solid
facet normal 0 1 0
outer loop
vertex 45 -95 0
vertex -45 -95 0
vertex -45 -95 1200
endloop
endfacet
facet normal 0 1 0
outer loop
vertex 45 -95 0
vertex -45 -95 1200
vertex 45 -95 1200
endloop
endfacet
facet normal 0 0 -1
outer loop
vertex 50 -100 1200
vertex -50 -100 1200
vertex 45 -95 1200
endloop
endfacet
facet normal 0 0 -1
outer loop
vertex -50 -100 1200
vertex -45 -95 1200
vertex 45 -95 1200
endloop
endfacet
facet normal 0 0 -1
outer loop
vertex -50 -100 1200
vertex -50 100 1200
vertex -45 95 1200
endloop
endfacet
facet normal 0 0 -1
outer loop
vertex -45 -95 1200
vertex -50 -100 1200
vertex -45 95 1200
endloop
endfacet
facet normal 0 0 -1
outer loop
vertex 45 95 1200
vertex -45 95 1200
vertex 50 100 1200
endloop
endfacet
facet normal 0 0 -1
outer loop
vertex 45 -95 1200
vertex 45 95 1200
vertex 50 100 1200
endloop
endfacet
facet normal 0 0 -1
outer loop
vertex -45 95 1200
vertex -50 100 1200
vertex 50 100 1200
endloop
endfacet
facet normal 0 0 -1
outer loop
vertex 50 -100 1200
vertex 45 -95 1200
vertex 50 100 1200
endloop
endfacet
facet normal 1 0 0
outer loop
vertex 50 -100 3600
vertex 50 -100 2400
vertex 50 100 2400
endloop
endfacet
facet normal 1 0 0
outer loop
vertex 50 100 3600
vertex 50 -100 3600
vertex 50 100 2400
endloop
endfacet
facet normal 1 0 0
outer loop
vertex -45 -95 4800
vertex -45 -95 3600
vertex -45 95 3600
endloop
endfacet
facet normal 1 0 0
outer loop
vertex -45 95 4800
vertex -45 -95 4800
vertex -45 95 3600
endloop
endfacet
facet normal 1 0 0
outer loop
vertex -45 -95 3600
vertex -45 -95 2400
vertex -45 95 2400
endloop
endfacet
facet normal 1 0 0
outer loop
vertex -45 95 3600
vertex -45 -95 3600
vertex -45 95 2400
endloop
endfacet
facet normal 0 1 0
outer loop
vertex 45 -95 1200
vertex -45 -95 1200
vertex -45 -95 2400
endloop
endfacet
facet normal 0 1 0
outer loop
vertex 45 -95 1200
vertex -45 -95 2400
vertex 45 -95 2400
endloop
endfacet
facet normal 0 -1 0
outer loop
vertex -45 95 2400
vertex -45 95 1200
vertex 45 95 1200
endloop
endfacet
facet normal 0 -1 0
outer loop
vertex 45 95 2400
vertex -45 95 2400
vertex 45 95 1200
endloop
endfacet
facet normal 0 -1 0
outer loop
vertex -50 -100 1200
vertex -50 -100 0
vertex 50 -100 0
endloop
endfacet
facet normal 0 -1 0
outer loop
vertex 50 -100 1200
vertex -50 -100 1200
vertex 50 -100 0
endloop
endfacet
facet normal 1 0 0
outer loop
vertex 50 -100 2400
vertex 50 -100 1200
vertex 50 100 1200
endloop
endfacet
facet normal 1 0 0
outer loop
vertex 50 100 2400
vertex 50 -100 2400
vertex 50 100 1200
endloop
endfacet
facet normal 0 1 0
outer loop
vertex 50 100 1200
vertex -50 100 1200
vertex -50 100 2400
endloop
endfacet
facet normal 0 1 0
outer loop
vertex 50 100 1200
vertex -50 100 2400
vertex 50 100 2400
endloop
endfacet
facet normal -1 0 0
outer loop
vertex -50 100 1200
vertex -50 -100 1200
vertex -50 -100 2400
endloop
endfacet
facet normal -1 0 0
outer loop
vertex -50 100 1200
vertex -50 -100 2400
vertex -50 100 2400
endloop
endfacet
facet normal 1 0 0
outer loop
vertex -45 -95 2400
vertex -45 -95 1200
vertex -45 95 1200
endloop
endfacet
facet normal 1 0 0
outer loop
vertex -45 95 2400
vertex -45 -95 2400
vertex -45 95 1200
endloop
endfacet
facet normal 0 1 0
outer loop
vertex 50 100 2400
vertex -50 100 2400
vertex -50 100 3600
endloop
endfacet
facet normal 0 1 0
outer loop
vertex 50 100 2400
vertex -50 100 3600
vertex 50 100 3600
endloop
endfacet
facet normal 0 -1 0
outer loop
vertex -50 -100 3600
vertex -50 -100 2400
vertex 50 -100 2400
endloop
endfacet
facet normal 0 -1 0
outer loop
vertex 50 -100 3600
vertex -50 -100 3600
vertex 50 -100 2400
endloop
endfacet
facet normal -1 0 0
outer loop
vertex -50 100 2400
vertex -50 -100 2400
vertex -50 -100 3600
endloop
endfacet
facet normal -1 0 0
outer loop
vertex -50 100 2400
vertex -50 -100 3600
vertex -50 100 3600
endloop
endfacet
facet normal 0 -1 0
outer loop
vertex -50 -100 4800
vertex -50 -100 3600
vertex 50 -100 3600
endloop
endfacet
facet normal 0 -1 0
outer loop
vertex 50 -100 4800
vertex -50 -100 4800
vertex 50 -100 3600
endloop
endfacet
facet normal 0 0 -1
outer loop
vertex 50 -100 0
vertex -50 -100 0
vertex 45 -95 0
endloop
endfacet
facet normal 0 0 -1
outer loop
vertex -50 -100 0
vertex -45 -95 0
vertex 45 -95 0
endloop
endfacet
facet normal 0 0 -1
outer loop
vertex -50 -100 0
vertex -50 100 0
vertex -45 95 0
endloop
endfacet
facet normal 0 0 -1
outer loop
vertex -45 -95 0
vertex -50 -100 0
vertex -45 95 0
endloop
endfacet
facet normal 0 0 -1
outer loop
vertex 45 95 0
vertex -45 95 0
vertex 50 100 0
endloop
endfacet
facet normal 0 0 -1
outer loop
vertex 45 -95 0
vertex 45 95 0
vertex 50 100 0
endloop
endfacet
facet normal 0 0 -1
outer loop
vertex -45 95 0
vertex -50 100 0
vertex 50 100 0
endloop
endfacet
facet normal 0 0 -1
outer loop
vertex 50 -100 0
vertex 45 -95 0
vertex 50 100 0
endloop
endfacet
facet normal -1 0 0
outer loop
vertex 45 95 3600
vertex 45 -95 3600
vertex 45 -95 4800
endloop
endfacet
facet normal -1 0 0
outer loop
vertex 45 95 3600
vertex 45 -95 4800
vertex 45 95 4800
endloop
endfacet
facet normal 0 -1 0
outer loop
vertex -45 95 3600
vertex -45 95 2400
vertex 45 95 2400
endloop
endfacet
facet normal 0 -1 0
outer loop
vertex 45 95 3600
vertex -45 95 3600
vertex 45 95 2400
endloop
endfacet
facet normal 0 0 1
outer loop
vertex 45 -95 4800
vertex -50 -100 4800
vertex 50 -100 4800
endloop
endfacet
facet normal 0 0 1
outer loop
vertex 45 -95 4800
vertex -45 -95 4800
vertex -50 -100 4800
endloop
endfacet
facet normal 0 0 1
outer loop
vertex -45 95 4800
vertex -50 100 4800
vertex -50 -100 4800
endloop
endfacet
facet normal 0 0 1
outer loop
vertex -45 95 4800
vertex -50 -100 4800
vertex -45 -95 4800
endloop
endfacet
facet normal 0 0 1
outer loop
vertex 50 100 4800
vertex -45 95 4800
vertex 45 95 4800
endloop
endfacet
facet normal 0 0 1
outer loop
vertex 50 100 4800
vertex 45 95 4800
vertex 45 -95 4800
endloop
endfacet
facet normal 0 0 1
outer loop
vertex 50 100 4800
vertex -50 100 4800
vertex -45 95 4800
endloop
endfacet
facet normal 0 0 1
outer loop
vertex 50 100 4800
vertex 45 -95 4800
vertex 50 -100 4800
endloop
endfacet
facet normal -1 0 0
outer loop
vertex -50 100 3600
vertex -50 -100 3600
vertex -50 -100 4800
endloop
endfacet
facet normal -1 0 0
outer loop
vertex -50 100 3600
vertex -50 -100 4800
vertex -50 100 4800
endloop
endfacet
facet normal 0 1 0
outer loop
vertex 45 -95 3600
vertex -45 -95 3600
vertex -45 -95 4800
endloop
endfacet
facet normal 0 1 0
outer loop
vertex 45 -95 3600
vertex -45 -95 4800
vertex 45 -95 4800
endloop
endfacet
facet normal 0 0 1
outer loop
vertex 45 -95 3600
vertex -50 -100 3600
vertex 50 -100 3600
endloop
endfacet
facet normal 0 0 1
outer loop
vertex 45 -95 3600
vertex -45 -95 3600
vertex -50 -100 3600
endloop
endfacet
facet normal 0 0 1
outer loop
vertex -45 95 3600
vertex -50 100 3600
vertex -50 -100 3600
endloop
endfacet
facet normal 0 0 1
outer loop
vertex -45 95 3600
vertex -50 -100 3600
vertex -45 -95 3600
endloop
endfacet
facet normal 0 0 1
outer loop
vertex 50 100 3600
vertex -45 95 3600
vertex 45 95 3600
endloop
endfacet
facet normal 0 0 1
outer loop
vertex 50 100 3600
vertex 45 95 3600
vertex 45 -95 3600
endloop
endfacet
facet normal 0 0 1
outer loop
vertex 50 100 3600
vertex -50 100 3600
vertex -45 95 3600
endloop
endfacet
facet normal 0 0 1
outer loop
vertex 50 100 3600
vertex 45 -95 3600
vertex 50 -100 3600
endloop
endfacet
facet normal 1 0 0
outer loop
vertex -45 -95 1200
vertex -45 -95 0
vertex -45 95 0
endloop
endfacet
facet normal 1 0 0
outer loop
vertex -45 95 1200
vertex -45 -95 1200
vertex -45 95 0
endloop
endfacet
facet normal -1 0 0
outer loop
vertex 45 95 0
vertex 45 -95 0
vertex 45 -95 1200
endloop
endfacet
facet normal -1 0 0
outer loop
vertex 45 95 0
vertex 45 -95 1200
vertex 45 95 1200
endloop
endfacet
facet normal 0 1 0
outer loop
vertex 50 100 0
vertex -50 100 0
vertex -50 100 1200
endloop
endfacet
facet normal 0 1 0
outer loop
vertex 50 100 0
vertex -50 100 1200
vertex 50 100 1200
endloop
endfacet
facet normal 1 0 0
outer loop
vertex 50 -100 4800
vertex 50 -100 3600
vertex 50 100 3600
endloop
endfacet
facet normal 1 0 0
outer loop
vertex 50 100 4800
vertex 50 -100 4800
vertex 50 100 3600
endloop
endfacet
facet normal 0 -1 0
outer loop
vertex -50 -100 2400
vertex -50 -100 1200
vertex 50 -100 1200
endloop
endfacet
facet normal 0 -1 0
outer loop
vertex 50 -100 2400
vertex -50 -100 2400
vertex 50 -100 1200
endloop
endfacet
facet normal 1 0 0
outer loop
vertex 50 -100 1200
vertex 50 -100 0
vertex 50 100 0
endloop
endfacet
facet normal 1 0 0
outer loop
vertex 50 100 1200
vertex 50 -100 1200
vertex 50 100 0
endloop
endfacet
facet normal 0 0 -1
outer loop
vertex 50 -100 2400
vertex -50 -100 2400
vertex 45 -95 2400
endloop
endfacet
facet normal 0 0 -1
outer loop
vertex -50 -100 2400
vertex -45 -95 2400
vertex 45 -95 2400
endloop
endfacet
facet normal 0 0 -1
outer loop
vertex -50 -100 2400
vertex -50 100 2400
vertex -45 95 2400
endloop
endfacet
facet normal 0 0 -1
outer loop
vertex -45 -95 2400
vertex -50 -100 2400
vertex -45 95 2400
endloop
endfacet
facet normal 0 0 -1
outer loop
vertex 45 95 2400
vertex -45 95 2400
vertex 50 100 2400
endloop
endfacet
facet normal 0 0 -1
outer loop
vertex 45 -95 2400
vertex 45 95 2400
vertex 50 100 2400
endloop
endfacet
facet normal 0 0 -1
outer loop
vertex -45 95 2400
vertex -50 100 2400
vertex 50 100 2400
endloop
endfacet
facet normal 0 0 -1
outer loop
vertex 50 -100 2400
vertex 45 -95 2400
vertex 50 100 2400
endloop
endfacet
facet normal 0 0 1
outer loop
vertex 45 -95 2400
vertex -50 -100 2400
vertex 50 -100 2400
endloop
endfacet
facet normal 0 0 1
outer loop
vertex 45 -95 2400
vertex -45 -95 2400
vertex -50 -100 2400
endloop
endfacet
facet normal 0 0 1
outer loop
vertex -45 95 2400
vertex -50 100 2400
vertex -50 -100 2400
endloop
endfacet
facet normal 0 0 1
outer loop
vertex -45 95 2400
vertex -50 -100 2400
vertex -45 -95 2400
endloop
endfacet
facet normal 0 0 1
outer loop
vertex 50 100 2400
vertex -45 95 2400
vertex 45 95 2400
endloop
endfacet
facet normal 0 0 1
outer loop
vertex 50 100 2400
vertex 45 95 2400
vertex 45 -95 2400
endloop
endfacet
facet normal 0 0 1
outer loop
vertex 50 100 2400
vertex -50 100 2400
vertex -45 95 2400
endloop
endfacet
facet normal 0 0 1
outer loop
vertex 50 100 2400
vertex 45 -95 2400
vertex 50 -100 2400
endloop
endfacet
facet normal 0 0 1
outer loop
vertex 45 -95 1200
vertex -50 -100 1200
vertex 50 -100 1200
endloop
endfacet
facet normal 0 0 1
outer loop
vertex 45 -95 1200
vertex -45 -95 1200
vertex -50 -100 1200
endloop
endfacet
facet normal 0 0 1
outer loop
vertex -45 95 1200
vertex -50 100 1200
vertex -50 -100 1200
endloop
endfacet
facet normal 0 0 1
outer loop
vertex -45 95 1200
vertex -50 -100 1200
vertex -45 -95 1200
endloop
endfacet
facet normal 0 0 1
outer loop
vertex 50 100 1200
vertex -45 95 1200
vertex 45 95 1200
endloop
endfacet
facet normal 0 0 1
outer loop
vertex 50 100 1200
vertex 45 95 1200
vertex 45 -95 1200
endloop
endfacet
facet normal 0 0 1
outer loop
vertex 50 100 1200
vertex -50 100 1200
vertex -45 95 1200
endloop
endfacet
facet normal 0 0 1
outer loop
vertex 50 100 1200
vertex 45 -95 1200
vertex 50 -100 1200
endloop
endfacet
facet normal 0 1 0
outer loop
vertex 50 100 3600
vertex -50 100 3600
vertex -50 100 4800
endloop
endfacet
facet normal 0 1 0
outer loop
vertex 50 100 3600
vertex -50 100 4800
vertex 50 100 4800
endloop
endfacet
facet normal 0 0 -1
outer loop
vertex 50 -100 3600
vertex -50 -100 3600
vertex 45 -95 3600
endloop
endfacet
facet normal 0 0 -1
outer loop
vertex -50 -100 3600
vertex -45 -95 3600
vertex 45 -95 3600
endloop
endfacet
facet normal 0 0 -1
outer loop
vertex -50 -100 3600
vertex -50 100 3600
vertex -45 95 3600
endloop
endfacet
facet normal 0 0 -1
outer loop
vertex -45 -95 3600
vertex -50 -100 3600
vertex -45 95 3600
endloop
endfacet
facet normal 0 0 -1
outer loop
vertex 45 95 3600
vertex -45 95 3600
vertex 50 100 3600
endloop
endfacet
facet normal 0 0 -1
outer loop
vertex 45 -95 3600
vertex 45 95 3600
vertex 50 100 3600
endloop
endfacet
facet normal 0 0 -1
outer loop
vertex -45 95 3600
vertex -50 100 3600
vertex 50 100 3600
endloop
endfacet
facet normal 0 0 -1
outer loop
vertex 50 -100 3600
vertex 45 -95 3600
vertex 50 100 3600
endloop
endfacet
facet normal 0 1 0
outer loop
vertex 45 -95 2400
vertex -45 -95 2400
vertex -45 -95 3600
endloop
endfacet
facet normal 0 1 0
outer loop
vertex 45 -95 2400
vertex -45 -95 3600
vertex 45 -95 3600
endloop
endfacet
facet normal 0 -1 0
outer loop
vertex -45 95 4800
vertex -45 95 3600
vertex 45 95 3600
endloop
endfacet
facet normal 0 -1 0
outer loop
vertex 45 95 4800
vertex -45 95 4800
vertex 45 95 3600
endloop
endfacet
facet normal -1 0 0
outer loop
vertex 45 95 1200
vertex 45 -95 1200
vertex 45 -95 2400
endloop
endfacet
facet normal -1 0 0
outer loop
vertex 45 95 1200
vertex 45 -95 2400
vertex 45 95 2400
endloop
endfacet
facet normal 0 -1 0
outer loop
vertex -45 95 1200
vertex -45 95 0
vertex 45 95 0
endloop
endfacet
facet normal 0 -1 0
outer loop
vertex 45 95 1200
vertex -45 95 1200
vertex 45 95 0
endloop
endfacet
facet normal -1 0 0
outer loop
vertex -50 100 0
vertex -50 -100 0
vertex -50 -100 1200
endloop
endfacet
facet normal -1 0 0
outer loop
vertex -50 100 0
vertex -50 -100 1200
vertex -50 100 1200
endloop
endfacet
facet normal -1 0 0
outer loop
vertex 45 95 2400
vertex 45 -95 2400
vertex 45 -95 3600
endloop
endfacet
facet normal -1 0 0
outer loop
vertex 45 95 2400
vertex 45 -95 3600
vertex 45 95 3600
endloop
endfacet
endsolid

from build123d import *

# Parameters (mm, degrees)
SKETCH_1_W      = 100
SKETCH_1_H      = 200
SKETCH_1_W_2    = 90
SKETCH_1_H_2    = 190
EXTRUDE_1_DEPTH = 1200
EXTRUDE_START   = 1200
SKETCH_1_2_W    = 100
SKETCH_1_2_H    = 200
SKETCH_1_2_W_2  = 90
SKETCH_1_2_H_2  = 190
EXTRUDE_2_DEPTH = 1200
EXTRUDE_START_2 = 2400
SKETCH_1_3_W    = 100
SKETCH_1_3_H    = 200
SKETCH_1_3_W_2  = 90
SKETCH_1_3_H_2  = 190
EXTRUDE_3_DEPTH = 1200
EXTRUDE_START_3 = 3600
SKETCH_1_4_W    = 100
SKETCH_1_4_H    = 200
SKETCH_1_4_W_2  = 90
SKETCH_1_4_H_2  = 190
EXTRUDE_4_DEPTH = 1200


with BuildPart() as part:
    # Эскиз1 → Бобышка-Вытянуть1 (new body)
    with BuildSketch(Plane.XY):
        Rectangle(SKETCH_1_W, SKETCH_1_H)
        Rectangle(SKETCH_1_W_2, SKETCH_1_H_2, mode=Mode.SUBTRACT)
    extrude(amount=EXTRUDE_1_DEPTH)


with BuildPart() as body_2:
    # Эскиз1<2> → Бобышка-Вытянуть2 (new body)
    with BuildSketch(Plane.XY.offset(EXTRUDE_START)):
        Rectangle(SKETCH_1_2_W, SKETCH_1_2_H)
        Rectangle(SKETCH_1_2_W_2, SKETCH_1_2_H_2, mode=Mode.SUBTRACT)
    extrude(amount=EXTRUDE_2_DEPTH)


with BuildPart() as body_3:
    # Эскиз1<3> → Бобышка-Вытянуть3 (new body)
    with BuildSketch(Plane.XY.offset(EXTRUDE_START_2)):
        Rectangle(SKETCH_1_3_W, SKETCH_1_3_H)
        Rectangle(SKETCH_1_3_W_2, SKETCH_1_3_H_2, mode=Mode.SUBTRACT)
    extrude(amount=EXTRUDE_3_DEPTH)


with BuildPart() as body_4:
    # Эскиз1<4> → Бобышка-Вытянуть4 (new body)
    with BuildSketch(Plane.XY.offset(EXTRUDE_START_3)):
        Rectangle(SKETCH_1_4_W, SKETCH_1_4_H)
        Rectangle(SKETCH_1_4_W_2, SKETCH_1_4_H_2, mode=Mode.SUBTRACT)
    extrude(amount=EXTRUDE_4_DEPTH)


solid = Compound([part.part, body_2.part, body_3.part, body_4.part])
